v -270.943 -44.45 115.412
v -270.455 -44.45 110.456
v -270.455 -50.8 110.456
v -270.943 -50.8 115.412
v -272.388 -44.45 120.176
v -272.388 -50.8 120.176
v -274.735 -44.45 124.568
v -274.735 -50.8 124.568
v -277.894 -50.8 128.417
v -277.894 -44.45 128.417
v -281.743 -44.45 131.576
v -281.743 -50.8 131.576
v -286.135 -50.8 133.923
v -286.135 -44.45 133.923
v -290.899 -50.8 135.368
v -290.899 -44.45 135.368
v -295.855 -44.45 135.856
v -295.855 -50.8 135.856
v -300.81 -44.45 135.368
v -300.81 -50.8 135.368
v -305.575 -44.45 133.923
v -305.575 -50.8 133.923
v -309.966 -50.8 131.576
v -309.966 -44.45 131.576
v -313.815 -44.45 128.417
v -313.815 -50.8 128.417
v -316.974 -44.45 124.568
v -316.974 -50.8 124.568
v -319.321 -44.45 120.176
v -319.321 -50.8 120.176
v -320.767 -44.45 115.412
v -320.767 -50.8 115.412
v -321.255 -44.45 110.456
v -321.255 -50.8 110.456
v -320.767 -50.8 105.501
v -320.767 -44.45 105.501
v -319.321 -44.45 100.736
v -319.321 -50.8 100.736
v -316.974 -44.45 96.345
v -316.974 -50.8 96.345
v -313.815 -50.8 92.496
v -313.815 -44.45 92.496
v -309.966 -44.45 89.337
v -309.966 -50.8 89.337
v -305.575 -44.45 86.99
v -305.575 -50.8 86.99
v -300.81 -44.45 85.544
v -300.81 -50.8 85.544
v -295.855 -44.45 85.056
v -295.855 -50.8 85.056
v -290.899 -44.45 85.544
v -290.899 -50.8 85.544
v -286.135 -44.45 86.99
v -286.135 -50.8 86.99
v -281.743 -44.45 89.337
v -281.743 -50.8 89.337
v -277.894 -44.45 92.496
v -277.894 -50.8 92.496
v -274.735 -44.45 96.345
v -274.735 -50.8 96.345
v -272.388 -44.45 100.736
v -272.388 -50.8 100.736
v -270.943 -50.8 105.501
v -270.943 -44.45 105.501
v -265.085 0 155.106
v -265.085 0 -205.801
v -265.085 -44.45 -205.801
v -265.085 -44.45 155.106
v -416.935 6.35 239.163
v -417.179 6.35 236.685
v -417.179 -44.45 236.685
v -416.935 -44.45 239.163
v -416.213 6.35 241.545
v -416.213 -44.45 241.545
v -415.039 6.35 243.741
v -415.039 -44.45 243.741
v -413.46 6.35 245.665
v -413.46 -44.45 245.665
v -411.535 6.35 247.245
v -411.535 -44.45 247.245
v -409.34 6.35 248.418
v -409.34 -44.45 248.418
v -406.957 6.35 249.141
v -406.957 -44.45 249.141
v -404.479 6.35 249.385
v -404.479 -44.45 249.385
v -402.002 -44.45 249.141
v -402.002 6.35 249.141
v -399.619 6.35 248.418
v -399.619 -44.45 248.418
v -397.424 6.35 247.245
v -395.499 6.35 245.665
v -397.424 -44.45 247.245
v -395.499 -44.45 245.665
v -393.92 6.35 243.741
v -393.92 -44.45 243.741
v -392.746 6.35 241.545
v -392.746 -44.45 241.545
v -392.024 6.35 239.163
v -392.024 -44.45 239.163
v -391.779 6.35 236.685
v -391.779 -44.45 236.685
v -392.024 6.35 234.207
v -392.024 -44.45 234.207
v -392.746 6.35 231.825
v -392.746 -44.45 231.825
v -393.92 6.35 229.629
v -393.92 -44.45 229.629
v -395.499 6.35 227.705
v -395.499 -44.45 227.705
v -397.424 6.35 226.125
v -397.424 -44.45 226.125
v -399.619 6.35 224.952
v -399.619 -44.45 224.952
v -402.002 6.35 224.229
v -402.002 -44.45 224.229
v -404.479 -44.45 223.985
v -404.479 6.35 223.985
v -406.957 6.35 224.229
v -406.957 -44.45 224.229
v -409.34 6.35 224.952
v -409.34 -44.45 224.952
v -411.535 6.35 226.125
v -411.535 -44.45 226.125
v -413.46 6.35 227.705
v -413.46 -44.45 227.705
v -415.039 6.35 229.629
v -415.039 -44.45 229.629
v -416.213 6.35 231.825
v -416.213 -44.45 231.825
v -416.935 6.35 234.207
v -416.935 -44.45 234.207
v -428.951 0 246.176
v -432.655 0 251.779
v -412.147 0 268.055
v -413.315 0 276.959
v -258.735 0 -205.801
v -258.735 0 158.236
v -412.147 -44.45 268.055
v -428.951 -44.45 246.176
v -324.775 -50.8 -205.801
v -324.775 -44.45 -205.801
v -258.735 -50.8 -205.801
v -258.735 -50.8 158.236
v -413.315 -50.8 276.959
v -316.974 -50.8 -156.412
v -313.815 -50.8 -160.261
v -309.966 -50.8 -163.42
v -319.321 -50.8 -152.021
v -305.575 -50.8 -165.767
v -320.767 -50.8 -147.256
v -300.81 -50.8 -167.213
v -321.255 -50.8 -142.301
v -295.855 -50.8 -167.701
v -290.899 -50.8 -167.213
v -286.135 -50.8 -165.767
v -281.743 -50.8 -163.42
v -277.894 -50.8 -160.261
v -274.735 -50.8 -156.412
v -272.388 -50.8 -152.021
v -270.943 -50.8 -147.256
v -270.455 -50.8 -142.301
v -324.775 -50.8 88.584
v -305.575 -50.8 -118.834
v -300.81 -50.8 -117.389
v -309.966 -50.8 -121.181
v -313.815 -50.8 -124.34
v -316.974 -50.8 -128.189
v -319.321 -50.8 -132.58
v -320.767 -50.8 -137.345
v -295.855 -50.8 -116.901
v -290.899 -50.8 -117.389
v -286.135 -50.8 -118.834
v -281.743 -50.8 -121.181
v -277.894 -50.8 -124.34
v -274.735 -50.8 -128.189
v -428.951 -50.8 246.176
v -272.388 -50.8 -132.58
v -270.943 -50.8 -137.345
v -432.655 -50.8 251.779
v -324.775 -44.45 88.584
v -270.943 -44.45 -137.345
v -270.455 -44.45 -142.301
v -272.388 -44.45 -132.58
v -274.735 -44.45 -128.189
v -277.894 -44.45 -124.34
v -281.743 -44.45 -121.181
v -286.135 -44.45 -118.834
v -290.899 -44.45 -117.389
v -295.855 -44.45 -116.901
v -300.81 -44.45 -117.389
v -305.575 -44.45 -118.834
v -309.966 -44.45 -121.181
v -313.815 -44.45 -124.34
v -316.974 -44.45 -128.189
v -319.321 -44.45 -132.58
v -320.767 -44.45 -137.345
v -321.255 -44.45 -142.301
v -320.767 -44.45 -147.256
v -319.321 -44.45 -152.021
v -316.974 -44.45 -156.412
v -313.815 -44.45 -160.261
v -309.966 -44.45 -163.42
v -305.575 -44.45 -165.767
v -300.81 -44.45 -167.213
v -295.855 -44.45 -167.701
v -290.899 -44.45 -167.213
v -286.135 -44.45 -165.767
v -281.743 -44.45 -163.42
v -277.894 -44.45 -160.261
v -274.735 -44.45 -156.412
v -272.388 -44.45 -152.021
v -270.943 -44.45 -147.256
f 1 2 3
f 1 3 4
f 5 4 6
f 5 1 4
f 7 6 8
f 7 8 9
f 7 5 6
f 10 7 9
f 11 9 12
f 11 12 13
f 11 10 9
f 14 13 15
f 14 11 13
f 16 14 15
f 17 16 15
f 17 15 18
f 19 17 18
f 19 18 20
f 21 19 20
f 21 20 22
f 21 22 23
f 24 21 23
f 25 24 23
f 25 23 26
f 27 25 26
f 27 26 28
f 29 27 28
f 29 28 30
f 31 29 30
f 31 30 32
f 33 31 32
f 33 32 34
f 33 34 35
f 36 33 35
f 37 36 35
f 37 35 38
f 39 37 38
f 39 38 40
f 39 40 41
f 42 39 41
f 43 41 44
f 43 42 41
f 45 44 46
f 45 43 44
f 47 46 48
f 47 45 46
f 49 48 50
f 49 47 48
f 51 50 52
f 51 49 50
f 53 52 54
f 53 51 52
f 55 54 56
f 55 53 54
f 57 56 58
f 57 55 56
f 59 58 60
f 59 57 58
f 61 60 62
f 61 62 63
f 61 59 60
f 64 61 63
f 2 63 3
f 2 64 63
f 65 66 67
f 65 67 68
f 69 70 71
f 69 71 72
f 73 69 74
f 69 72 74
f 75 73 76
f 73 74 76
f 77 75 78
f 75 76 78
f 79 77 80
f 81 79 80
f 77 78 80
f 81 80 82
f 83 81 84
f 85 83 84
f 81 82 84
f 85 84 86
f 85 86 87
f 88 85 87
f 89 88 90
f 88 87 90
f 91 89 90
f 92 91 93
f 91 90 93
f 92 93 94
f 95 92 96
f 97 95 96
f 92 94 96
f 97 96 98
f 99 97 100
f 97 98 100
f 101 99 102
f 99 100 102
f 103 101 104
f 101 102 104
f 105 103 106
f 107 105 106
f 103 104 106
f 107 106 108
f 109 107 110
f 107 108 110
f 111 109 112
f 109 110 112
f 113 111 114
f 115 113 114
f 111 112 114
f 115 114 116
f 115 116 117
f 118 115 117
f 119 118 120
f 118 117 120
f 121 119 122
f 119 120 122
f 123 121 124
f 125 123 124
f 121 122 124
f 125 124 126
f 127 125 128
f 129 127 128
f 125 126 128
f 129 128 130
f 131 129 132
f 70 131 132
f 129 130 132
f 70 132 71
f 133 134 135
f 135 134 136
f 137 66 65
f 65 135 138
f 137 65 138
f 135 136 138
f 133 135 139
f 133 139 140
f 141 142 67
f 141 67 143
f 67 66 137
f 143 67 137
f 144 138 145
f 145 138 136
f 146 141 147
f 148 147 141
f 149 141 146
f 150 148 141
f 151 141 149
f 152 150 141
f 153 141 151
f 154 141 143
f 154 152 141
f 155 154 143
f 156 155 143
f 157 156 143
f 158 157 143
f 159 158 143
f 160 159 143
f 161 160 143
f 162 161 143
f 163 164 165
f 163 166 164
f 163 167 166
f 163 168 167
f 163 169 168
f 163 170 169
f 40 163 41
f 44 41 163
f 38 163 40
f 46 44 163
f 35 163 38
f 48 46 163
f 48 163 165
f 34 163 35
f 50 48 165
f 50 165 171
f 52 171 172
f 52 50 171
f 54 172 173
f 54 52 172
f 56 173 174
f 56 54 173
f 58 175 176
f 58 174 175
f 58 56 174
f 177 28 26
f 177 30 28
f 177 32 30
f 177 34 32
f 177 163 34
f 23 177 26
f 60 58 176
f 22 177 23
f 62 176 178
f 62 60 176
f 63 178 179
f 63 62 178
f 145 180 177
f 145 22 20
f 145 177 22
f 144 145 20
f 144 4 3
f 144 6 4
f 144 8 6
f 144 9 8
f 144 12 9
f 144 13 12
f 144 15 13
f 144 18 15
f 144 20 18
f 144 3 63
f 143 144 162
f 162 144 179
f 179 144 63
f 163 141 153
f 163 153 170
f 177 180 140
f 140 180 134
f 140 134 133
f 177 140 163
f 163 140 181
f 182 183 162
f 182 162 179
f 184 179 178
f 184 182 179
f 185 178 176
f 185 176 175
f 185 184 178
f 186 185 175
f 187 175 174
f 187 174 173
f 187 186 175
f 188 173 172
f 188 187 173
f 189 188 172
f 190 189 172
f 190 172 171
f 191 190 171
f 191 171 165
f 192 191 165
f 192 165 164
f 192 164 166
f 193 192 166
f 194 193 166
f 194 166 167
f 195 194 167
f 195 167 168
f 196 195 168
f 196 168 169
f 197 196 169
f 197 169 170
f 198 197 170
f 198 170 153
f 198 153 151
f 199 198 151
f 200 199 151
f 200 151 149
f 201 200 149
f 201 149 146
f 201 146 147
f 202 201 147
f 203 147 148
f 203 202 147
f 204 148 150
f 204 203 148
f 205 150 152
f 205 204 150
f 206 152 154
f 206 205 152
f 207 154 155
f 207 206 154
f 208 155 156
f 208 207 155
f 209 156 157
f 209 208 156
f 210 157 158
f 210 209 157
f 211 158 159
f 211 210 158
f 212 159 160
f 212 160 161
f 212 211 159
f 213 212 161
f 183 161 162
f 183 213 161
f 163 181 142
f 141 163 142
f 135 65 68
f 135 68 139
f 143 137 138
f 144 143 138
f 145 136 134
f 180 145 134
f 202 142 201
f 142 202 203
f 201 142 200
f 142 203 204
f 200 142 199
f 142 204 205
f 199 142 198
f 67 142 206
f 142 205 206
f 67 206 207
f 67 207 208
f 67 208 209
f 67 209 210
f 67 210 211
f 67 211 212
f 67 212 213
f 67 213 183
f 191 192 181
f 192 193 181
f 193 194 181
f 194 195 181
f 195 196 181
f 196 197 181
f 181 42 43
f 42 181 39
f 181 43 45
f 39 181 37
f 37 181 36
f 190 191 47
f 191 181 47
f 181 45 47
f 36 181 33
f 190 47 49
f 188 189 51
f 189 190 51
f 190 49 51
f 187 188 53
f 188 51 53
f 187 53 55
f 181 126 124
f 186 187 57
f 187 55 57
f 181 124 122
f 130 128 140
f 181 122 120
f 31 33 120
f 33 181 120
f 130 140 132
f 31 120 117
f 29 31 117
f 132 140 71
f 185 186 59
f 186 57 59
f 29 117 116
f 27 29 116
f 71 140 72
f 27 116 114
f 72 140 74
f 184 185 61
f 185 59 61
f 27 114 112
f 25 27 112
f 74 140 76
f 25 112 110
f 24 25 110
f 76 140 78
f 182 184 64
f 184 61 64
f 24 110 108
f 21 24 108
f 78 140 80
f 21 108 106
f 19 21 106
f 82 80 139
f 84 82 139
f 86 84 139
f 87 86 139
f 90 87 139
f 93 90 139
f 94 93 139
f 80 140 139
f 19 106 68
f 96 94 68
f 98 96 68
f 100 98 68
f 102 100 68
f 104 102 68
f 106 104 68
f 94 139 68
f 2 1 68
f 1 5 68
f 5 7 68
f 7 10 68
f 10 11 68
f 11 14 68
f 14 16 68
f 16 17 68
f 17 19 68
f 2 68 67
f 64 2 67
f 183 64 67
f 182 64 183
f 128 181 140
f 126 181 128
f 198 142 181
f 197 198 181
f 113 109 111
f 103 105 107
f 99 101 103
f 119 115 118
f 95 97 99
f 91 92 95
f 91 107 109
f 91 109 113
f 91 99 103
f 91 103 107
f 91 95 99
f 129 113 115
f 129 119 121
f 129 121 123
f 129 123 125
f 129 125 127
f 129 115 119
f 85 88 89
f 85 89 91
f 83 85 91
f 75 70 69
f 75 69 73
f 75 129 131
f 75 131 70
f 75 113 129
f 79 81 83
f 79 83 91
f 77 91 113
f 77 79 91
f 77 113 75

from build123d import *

# Parameters (mm, degrees)
F0_R     = 25.4
F1_DEPTH = 50.8
F2_DEPTH = 44.45
F3_R     = 12.7
F4_DEPTH = 50.8


with BuildPart() as f1:
    # F0 (on Front) → F1 (new body)
    with BuildSketch(Plane.XZ):
        Polygon((-324.775483, -205.800596), (-265.085489, -205.800596), (-265.085489, 155.105879), (-412.146998, 268.055191), (-428.950995, 246.176162), (-324.775483, 88.584425), align=None)
        with Locations((-295.854737, -142.300596)):
            Circle(F0_R, mode=Mode.SUBTRACT)
        with Locations((-295.854737, 110.456314)):
            Circle(F0_R, mode=Mode.SUBTRACT)
        Polygon((-265.085489, -205.800596), (-258.735483, -205.800596), (-258.735483, 158.235581), (-413.315155, 276.959153), (-432.65465, 251.778873), (-428.950995, 246.176162), (-412.146998, 268.055191), (-265.085489, 155.105879), align=None)
    extrude(amount=F1_DEPTH)

    # F0 (on Front) → F2 (cut)
    with BuildSketch(Plane.XZ):
        Polygon((-324.775483, -205.800596), (-265.085489, -205.800596), (-265.085489, 155.105879), (-412.146998, 268.055191), (-428.950995, 246.176162), (-324.775483, 88.584425), align=None)
        with Locations((-295.854737, -142.300596)):
            Circle(F0_R, mode=Mode.SUBTRACT)
        with Locations((-295.854737, 110.456314)):
            Circle(F0_R, mode=Mode.SUBTRACT)
    extrude(amount=F2_DEPTH, mode=Mode.SUBTRACT)

    # F3 (on face) → F4 (join)
    with BuildSketch(Plane(origin=(0, -44.45, 0), x_dir=(-1, 0, 0), z_dir=(0, 1, 0))):
        with Locations((404.479494, 236.68493)):
            Circle(F3_R)
    extrude(amount=F4_DEPTH)


solid = f1.part
